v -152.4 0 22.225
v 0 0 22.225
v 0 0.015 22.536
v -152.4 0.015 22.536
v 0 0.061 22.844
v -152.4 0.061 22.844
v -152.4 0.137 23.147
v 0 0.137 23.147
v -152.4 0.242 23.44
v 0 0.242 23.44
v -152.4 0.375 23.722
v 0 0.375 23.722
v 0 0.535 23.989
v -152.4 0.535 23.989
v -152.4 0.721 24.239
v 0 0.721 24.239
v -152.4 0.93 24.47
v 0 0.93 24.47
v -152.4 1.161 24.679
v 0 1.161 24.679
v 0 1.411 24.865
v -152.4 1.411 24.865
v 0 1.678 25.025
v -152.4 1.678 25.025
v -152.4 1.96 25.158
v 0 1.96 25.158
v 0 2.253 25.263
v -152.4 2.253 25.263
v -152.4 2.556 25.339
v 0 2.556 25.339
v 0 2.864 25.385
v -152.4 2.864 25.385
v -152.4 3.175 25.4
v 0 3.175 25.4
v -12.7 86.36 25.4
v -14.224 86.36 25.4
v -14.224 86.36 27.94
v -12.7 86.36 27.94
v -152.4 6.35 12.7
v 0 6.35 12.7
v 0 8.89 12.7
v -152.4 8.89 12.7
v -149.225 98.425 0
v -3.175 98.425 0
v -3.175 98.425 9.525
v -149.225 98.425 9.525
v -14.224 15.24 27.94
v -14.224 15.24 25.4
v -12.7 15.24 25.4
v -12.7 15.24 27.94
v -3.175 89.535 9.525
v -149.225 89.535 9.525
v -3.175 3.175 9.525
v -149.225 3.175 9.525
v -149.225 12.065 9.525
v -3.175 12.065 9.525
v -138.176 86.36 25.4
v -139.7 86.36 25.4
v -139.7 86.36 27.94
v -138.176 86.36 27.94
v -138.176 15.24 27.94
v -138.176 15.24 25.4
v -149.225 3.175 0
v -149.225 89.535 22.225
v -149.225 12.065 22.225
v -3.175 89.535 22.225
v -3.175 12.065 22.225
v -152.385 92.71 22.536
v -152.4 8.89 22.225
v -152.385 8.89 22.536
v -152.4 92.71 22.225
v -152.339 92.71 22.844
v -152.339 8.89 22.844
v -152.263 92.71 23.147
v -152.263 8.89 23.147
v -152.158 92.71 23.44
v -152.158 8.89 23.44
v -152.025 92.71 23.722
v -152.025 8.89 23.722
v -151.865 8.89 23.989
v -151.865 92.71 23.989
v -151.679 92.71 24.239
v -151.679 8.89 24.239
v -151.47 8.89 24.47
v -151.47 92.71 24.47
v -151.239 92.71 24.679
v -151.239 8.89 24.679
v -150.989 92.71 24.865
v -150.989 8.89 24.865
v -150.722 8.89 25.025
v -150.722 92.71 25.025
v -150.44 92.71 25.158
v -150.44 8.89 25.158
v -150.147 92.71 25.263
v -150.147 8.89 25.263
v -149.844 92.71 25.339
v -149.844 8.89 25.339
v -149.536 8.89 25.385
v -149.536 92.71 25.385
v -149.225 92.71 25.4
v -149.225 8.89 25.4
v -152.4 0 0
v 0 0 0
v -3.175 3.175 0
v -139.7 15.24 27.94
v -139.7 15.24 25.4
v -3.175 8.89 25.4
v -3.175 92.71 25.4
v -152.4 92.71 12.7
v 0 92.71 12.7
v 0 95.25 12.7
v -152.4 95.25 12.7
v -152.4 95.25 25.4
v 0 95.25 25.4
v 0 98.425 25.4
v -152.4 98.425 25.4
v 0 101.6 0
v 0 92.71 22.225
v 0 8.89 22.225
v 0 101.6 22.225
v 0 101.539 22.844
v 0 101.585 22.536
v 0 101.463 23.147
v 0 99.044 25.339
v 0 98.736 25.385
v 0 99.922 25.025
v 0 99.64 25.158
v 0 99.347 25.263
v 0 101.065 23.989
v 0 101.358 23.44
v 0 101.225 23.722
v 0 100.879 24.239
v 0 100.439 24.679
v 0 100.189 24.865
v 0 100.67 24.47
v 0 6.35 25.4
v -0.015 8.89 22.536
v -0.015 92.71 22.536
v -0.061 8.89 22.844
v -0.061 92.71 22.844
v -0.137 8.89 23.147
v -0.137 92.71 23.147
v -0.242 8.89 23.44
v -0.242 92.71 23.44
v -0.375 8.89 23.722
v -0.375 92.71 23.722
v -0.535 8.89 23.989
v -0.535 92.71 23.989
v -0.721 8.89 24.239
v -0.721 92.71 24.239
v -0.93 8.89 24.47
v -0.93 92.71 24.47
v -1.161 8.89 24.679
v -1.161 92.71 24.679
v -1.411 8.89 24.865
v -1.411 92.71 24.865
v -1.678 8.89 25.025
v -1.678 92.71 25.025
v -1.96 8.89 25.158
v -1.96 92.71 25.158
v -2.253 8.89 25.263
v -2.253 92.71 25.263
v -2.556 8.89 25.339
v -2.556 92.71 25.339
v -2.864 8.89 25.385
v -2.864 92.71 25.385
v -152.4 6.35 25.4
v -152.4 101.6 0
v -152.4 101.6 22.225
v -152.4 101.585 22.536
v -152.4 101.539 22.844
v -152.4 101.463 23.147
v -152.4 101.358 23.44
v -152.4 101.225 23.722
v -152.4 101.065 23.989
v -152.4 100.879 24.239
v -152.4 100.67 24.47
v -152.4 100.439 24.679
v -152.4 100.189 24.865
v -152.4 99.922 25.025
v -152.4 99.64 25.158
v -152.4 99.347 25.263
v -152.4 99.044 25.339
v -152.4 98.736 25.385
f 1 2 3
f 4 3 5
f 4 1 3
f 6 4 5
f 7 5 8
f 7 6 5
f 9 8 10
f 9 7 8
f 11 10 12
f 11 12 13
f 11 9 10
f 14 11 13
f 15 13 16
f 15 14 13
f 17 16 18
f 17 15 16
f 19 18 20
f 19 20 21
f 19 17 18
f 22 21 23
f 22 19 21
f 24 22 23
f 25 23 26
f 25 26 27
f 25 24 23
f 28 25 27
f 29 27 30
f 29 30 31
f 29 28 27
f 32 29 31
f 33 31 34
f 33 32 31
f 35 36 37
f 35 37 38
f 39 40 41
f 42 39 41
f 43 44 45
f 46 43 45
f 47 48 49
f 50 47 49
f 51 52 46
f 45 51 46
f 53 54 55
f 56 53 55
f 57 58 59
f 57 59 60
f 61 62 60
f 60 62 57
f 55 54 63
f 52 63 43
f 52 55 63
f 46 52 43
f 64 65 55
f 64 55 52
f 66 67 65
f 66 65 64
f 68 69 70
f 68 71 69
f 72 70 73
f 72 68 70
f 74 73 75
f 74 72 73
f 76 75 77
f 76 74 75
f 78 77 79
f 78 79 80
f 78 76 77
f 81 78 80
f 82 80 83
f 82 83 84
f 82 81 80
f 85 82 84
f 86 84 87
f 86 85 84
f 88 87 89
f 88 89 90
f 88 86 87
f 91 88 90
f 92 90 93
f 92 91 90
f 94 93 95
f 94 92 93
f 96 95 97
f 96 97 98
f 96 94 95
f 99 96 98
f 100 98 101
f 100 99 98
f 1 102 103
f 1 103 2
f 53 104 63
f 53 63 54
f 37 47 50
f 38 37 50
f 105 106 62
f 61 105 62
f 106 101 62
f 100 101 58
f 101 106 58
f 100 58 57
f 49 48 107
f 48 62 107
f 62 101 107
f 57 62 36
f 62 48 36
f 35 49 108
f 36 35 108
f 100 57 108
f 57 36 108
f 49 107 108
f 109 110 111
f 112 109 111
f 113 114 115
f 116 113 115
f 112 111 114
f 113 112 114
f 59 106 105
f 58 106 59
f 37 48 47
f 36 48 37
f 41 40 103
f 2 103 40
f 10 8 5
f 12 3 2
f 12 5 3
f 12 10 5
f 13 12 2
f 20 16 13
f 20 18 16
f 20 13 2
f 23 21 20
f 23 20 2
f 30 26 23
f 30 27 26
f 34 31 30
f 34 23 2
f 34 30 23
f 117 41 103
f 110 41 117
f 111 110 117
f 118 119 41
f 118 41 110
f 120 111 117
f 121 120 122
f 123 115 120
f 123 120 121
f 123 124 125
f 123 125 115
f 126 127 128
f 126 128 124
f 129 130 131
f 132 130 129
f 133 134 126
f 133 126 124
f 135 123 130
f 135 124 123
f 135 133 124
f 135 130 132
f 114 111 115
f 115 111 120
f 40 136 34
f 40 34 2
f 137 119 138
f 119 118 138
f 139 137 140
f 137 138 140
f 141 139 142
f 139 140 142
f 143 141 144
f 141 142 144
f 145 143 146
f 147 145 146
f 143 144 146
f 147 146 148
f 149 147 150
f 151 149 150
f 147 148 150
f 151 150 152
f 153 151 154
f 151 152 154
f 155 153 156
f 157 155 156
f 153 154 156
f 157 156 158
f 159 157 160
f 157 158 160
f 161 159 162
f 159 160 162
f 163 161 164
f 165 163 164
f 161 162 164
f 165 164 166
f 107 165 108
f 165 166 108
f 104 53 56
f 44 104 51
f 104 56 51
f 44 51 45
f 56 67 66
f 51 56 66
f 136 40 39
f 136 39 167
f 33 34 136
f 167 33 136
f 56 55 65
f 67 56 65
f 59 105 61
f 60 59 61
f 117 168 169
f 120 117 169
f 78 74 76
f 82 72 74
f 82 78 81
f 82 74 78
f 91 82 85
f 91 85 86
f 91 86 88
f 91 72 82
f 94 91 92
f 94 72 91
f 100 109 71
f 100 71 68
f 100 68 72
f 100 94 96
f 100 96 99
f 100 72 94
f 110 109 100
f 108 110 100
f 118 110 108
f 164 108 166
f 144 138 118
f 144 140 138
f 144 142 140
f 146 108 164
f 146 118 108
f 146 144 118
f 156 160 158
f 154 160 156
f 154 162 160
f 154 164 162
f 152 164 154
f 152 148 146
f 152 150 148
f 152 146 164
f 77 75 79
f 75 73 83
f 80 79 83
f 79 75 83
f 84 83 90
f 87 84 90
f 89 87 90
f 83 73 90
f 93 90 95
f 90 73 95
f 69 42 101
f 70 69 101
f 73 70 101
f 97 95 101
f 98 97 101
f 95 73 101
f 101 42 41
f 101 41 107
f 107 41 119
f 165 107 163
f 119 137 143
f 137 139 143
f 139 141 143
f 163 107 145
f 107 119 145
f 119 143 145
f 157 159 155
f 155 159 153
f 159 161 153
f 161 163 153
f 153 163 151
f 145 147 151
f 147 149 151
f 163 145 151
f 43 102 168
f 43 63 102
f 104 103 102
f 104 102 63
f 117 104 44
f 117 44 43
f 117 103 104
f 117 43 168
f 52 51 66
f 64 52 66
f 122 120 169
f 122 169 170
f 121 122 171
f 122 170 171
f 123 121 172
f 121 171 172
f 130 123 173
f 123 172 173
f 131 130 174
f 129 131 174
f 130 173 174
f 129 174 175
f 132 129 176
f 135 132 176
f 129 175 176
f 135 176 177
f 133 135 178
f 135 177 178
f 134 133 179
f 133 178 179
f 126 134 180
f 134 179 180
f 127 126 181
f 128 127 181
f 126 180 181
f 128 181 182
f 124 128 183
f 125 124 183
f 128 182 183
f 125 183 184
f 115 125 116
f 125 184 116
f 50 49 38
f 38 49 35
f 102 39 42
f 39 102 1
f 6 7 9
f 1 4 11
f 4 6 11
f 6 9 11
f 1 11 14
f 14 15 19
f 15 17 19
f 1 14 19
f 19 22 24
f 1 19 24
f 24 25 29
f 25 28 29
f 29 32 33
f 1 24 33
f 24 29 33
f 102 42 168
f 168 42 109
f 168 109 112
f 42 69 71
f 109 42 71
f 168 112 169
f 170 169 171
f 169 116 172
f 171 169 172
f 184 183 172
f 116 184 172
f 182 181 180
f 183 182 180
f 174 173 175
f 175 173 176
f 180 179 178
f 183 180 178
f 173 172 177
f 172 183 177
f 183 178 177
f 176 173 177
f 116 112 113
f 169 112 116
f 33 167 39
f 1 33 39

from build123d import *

# Parameters (mm, degrees)
F0_W        = 101.6
F0_H        = 25.4
F1_DEPTH    = 152.4
F2_W        = 2.54
F2_H        = 12.7
F3_DEPTH    = 152.401
F4_W        = 1.524
F4_H        = 71.12
F5_DEPTH    = 2.54
F6_R        = 3.175
F7_T        = 3.175
F7_T3_DEPTH = 158.75
F7_T5_DEPTH = 77.47
F7_T7_DEPTH = 7.874
F7_T9_DEPTH = 7.874


# Not quite as in the source:
# - a shell that OpenCascade refuses in one call is made with other operations: the cavity is built on its own and cut out


with BuildPart() as f1:
    # F0 (on Right) → F1 (new body)
    with BuildSketch(Plane.YZ):
        with Locations((50.8, 12.7)):
            Rectangle(F0_W, F0_H)
    extrude(amount=-F1_DEPTH)

    # F2 (on face) → F3 (cut, through all)
    with BuildSketch(Plane.YZ):
        with Locations((7.62, 19.05)):
            Rectangle(F2_W, F2_H)
        with Locations((93.98, 19.05)):
            Rectangle(F2_W, F2_H)
    extrude(amount=-F3_DEPTH, mode=Mode.SUBTRACT)

    # F4 (on face) → F5 (join)
    with BuildSketch(Plane.XY.offset(25.4)):
        with Locations((-138.938, 50.8)):
            Rectangle(F4_W, F4_H)
        with Locations((-13.462, 50.8)):
            Rectangle(F4_W, F4_H)
    extrude(amount=F5_DEPTH)

    # F6
    f6_edges = [f1.edges().sort_by_distance(p)[0] for p in [
        (-76.2, 0, 25.4),
        (-76.2, 101.6, 25.4),
        (0, 50.8, 25.4),
        (-152.4, 50.8, 25.4),
    ]]
    fillet(f6_edges, radius=F6_R)

    # F7: shell of thickness 3.175, made by hand


with BuildPart() as f7_core1:
    # F7_t2: copy of F1
    add(f1.part)

    # the walls: a layer under each face that stays
    f7_faces = [f7_core1.faces().sort_by_distance(p)[0] for p in [
        (-76.2, 0, 11.1125),
        (0, 50.8, 12.7),
        (-152.4, 50.8, 12.7),
        (-76.2, 4.7625, 25.4),
        (-76.2, 6.35, 19.05),
        (-76.2, 7.62, 12.7),
        (-76.2, 8.89, 19.05),
        (-76.2, 101.6, 11.1125),
        (-76.2, 92.71, 19.05),
        (-76.2, 96.8375, 25.4),
        (-76.2, 93.98, 12.7),
        (-76.2, 95.25, 19.05),
        (-76.2, 50.8, 25.4),
        (-138.176, 50.8, 26.67),
        (-138.938, 86.36, 26.67),
        (-139.7, 50.8, 26.67),
        (-138.938, 15.24, 26.67),
        (-12.7, 50.8, 26.67),
        (-13.462, 86.36, 26.67),
        (-14.224, 50.8, 26.67),
        (-13.462, 15.24, 26.67),
        (-138.938, 50.8, 27.94),
        (-13.462, 50.8, 27.94),
    ]]
    thicken(f7_faces, amount=-F7_T, mode=Mode.SUBTRACT)

    # F7_s4 → F7_t3 (cut)
    with BuildSketch(Plane.YZ.offset(-155.575)):
        Polygon((6.38175, 12.73175), (3.175, 12.7), (3.175, 9.525), (6.35, 9.525), align=None)
        Polygon((8.85825, 12.73175), (8.89, 9.525), (12.065, 9.525), (12.065, 12.7), align=None)
        Polygon((92.74175, 12.73175), (89.535, 12.7), (89.535, 9.525), (92.71, 9.525), align=None)
        Polygon((95.21825, 12.73175), (95.25, 9.525), (98.425, 9.525), (98.425, 12.7), align=None)
    extrude(amount=F7_T3_DEPTH, mode=Mode.SUBTRACT)

    # F7_s6 → F7_t5 (cut)
    with BuildSketch(Plane.XZ.offset(-89.535)):
        Polygon((-138.14425, 25.43175), (-138.176, 22.225), (-141.351, 22.225), (-141.351, 25.4), align=None)
        Polygon((-139.73175, 25.43175), (-139.7, 22.225), (-136.525, 22.225), (-136.525, 25.4), align=None)
        Polygon((-12.66825, 25.43175), (-12.7, 22.225), (-15.875, 22.225), (-15.875, 25.4), align=None)
        Polygon((-14.25575, 25.43175), (-14.224, 22.225), (-11.049, 22.225), (-11.049, 25.4), align=None)
    extrude(amount=F7_T5_DEPTH, mode=Mode.SUBTRACT)

    # F7_s8 → F7_t7 (cut)
    with BuildSketch(Plane.YZ.offset(-142.875)):
        Polygon((86.39175, 25.43175), (86.36, 22.225), (83.185, 22.225), (83.185, 25.4), align=None)
        Polygon((15.20825, 25.43175), (15.24, 22.225), (18.415, 22.225), (18.415, 25.4), align=None)
    extrude(amount=F7_T7_DEPTH, mode=Mode.SUBTRACT)

    # F7_s10 → F7_t9 (cut)
    with BuildSketch(Plane.YZ.offset(-17.399)):
        Polygon((86.39175, 25.43175), (86.36, 22.225), (83.185, 22.225), (83.185, 25.4), align=None)
        Polygon((15.20825, 25.43175), (15.24, 22.225), (18.415, 22.225), (18.415, 25.4), align=None)
    extrude(amount=F7_T9_DEPTH, mode=Mode.SUBTRACT)


with BuildPart() as f1_1:
    add(f1.part)

    # what is left inside the walls is the cavity
    f7_cavity = [f7_core1.part.solids().sort_by_distance(p)[0] for p in [
        (-100.541667, 50.8, 0.03175),
    ]]
    add(f7_cavity, mode=Mode.SUBTRACT)


solid = f1_1.part
